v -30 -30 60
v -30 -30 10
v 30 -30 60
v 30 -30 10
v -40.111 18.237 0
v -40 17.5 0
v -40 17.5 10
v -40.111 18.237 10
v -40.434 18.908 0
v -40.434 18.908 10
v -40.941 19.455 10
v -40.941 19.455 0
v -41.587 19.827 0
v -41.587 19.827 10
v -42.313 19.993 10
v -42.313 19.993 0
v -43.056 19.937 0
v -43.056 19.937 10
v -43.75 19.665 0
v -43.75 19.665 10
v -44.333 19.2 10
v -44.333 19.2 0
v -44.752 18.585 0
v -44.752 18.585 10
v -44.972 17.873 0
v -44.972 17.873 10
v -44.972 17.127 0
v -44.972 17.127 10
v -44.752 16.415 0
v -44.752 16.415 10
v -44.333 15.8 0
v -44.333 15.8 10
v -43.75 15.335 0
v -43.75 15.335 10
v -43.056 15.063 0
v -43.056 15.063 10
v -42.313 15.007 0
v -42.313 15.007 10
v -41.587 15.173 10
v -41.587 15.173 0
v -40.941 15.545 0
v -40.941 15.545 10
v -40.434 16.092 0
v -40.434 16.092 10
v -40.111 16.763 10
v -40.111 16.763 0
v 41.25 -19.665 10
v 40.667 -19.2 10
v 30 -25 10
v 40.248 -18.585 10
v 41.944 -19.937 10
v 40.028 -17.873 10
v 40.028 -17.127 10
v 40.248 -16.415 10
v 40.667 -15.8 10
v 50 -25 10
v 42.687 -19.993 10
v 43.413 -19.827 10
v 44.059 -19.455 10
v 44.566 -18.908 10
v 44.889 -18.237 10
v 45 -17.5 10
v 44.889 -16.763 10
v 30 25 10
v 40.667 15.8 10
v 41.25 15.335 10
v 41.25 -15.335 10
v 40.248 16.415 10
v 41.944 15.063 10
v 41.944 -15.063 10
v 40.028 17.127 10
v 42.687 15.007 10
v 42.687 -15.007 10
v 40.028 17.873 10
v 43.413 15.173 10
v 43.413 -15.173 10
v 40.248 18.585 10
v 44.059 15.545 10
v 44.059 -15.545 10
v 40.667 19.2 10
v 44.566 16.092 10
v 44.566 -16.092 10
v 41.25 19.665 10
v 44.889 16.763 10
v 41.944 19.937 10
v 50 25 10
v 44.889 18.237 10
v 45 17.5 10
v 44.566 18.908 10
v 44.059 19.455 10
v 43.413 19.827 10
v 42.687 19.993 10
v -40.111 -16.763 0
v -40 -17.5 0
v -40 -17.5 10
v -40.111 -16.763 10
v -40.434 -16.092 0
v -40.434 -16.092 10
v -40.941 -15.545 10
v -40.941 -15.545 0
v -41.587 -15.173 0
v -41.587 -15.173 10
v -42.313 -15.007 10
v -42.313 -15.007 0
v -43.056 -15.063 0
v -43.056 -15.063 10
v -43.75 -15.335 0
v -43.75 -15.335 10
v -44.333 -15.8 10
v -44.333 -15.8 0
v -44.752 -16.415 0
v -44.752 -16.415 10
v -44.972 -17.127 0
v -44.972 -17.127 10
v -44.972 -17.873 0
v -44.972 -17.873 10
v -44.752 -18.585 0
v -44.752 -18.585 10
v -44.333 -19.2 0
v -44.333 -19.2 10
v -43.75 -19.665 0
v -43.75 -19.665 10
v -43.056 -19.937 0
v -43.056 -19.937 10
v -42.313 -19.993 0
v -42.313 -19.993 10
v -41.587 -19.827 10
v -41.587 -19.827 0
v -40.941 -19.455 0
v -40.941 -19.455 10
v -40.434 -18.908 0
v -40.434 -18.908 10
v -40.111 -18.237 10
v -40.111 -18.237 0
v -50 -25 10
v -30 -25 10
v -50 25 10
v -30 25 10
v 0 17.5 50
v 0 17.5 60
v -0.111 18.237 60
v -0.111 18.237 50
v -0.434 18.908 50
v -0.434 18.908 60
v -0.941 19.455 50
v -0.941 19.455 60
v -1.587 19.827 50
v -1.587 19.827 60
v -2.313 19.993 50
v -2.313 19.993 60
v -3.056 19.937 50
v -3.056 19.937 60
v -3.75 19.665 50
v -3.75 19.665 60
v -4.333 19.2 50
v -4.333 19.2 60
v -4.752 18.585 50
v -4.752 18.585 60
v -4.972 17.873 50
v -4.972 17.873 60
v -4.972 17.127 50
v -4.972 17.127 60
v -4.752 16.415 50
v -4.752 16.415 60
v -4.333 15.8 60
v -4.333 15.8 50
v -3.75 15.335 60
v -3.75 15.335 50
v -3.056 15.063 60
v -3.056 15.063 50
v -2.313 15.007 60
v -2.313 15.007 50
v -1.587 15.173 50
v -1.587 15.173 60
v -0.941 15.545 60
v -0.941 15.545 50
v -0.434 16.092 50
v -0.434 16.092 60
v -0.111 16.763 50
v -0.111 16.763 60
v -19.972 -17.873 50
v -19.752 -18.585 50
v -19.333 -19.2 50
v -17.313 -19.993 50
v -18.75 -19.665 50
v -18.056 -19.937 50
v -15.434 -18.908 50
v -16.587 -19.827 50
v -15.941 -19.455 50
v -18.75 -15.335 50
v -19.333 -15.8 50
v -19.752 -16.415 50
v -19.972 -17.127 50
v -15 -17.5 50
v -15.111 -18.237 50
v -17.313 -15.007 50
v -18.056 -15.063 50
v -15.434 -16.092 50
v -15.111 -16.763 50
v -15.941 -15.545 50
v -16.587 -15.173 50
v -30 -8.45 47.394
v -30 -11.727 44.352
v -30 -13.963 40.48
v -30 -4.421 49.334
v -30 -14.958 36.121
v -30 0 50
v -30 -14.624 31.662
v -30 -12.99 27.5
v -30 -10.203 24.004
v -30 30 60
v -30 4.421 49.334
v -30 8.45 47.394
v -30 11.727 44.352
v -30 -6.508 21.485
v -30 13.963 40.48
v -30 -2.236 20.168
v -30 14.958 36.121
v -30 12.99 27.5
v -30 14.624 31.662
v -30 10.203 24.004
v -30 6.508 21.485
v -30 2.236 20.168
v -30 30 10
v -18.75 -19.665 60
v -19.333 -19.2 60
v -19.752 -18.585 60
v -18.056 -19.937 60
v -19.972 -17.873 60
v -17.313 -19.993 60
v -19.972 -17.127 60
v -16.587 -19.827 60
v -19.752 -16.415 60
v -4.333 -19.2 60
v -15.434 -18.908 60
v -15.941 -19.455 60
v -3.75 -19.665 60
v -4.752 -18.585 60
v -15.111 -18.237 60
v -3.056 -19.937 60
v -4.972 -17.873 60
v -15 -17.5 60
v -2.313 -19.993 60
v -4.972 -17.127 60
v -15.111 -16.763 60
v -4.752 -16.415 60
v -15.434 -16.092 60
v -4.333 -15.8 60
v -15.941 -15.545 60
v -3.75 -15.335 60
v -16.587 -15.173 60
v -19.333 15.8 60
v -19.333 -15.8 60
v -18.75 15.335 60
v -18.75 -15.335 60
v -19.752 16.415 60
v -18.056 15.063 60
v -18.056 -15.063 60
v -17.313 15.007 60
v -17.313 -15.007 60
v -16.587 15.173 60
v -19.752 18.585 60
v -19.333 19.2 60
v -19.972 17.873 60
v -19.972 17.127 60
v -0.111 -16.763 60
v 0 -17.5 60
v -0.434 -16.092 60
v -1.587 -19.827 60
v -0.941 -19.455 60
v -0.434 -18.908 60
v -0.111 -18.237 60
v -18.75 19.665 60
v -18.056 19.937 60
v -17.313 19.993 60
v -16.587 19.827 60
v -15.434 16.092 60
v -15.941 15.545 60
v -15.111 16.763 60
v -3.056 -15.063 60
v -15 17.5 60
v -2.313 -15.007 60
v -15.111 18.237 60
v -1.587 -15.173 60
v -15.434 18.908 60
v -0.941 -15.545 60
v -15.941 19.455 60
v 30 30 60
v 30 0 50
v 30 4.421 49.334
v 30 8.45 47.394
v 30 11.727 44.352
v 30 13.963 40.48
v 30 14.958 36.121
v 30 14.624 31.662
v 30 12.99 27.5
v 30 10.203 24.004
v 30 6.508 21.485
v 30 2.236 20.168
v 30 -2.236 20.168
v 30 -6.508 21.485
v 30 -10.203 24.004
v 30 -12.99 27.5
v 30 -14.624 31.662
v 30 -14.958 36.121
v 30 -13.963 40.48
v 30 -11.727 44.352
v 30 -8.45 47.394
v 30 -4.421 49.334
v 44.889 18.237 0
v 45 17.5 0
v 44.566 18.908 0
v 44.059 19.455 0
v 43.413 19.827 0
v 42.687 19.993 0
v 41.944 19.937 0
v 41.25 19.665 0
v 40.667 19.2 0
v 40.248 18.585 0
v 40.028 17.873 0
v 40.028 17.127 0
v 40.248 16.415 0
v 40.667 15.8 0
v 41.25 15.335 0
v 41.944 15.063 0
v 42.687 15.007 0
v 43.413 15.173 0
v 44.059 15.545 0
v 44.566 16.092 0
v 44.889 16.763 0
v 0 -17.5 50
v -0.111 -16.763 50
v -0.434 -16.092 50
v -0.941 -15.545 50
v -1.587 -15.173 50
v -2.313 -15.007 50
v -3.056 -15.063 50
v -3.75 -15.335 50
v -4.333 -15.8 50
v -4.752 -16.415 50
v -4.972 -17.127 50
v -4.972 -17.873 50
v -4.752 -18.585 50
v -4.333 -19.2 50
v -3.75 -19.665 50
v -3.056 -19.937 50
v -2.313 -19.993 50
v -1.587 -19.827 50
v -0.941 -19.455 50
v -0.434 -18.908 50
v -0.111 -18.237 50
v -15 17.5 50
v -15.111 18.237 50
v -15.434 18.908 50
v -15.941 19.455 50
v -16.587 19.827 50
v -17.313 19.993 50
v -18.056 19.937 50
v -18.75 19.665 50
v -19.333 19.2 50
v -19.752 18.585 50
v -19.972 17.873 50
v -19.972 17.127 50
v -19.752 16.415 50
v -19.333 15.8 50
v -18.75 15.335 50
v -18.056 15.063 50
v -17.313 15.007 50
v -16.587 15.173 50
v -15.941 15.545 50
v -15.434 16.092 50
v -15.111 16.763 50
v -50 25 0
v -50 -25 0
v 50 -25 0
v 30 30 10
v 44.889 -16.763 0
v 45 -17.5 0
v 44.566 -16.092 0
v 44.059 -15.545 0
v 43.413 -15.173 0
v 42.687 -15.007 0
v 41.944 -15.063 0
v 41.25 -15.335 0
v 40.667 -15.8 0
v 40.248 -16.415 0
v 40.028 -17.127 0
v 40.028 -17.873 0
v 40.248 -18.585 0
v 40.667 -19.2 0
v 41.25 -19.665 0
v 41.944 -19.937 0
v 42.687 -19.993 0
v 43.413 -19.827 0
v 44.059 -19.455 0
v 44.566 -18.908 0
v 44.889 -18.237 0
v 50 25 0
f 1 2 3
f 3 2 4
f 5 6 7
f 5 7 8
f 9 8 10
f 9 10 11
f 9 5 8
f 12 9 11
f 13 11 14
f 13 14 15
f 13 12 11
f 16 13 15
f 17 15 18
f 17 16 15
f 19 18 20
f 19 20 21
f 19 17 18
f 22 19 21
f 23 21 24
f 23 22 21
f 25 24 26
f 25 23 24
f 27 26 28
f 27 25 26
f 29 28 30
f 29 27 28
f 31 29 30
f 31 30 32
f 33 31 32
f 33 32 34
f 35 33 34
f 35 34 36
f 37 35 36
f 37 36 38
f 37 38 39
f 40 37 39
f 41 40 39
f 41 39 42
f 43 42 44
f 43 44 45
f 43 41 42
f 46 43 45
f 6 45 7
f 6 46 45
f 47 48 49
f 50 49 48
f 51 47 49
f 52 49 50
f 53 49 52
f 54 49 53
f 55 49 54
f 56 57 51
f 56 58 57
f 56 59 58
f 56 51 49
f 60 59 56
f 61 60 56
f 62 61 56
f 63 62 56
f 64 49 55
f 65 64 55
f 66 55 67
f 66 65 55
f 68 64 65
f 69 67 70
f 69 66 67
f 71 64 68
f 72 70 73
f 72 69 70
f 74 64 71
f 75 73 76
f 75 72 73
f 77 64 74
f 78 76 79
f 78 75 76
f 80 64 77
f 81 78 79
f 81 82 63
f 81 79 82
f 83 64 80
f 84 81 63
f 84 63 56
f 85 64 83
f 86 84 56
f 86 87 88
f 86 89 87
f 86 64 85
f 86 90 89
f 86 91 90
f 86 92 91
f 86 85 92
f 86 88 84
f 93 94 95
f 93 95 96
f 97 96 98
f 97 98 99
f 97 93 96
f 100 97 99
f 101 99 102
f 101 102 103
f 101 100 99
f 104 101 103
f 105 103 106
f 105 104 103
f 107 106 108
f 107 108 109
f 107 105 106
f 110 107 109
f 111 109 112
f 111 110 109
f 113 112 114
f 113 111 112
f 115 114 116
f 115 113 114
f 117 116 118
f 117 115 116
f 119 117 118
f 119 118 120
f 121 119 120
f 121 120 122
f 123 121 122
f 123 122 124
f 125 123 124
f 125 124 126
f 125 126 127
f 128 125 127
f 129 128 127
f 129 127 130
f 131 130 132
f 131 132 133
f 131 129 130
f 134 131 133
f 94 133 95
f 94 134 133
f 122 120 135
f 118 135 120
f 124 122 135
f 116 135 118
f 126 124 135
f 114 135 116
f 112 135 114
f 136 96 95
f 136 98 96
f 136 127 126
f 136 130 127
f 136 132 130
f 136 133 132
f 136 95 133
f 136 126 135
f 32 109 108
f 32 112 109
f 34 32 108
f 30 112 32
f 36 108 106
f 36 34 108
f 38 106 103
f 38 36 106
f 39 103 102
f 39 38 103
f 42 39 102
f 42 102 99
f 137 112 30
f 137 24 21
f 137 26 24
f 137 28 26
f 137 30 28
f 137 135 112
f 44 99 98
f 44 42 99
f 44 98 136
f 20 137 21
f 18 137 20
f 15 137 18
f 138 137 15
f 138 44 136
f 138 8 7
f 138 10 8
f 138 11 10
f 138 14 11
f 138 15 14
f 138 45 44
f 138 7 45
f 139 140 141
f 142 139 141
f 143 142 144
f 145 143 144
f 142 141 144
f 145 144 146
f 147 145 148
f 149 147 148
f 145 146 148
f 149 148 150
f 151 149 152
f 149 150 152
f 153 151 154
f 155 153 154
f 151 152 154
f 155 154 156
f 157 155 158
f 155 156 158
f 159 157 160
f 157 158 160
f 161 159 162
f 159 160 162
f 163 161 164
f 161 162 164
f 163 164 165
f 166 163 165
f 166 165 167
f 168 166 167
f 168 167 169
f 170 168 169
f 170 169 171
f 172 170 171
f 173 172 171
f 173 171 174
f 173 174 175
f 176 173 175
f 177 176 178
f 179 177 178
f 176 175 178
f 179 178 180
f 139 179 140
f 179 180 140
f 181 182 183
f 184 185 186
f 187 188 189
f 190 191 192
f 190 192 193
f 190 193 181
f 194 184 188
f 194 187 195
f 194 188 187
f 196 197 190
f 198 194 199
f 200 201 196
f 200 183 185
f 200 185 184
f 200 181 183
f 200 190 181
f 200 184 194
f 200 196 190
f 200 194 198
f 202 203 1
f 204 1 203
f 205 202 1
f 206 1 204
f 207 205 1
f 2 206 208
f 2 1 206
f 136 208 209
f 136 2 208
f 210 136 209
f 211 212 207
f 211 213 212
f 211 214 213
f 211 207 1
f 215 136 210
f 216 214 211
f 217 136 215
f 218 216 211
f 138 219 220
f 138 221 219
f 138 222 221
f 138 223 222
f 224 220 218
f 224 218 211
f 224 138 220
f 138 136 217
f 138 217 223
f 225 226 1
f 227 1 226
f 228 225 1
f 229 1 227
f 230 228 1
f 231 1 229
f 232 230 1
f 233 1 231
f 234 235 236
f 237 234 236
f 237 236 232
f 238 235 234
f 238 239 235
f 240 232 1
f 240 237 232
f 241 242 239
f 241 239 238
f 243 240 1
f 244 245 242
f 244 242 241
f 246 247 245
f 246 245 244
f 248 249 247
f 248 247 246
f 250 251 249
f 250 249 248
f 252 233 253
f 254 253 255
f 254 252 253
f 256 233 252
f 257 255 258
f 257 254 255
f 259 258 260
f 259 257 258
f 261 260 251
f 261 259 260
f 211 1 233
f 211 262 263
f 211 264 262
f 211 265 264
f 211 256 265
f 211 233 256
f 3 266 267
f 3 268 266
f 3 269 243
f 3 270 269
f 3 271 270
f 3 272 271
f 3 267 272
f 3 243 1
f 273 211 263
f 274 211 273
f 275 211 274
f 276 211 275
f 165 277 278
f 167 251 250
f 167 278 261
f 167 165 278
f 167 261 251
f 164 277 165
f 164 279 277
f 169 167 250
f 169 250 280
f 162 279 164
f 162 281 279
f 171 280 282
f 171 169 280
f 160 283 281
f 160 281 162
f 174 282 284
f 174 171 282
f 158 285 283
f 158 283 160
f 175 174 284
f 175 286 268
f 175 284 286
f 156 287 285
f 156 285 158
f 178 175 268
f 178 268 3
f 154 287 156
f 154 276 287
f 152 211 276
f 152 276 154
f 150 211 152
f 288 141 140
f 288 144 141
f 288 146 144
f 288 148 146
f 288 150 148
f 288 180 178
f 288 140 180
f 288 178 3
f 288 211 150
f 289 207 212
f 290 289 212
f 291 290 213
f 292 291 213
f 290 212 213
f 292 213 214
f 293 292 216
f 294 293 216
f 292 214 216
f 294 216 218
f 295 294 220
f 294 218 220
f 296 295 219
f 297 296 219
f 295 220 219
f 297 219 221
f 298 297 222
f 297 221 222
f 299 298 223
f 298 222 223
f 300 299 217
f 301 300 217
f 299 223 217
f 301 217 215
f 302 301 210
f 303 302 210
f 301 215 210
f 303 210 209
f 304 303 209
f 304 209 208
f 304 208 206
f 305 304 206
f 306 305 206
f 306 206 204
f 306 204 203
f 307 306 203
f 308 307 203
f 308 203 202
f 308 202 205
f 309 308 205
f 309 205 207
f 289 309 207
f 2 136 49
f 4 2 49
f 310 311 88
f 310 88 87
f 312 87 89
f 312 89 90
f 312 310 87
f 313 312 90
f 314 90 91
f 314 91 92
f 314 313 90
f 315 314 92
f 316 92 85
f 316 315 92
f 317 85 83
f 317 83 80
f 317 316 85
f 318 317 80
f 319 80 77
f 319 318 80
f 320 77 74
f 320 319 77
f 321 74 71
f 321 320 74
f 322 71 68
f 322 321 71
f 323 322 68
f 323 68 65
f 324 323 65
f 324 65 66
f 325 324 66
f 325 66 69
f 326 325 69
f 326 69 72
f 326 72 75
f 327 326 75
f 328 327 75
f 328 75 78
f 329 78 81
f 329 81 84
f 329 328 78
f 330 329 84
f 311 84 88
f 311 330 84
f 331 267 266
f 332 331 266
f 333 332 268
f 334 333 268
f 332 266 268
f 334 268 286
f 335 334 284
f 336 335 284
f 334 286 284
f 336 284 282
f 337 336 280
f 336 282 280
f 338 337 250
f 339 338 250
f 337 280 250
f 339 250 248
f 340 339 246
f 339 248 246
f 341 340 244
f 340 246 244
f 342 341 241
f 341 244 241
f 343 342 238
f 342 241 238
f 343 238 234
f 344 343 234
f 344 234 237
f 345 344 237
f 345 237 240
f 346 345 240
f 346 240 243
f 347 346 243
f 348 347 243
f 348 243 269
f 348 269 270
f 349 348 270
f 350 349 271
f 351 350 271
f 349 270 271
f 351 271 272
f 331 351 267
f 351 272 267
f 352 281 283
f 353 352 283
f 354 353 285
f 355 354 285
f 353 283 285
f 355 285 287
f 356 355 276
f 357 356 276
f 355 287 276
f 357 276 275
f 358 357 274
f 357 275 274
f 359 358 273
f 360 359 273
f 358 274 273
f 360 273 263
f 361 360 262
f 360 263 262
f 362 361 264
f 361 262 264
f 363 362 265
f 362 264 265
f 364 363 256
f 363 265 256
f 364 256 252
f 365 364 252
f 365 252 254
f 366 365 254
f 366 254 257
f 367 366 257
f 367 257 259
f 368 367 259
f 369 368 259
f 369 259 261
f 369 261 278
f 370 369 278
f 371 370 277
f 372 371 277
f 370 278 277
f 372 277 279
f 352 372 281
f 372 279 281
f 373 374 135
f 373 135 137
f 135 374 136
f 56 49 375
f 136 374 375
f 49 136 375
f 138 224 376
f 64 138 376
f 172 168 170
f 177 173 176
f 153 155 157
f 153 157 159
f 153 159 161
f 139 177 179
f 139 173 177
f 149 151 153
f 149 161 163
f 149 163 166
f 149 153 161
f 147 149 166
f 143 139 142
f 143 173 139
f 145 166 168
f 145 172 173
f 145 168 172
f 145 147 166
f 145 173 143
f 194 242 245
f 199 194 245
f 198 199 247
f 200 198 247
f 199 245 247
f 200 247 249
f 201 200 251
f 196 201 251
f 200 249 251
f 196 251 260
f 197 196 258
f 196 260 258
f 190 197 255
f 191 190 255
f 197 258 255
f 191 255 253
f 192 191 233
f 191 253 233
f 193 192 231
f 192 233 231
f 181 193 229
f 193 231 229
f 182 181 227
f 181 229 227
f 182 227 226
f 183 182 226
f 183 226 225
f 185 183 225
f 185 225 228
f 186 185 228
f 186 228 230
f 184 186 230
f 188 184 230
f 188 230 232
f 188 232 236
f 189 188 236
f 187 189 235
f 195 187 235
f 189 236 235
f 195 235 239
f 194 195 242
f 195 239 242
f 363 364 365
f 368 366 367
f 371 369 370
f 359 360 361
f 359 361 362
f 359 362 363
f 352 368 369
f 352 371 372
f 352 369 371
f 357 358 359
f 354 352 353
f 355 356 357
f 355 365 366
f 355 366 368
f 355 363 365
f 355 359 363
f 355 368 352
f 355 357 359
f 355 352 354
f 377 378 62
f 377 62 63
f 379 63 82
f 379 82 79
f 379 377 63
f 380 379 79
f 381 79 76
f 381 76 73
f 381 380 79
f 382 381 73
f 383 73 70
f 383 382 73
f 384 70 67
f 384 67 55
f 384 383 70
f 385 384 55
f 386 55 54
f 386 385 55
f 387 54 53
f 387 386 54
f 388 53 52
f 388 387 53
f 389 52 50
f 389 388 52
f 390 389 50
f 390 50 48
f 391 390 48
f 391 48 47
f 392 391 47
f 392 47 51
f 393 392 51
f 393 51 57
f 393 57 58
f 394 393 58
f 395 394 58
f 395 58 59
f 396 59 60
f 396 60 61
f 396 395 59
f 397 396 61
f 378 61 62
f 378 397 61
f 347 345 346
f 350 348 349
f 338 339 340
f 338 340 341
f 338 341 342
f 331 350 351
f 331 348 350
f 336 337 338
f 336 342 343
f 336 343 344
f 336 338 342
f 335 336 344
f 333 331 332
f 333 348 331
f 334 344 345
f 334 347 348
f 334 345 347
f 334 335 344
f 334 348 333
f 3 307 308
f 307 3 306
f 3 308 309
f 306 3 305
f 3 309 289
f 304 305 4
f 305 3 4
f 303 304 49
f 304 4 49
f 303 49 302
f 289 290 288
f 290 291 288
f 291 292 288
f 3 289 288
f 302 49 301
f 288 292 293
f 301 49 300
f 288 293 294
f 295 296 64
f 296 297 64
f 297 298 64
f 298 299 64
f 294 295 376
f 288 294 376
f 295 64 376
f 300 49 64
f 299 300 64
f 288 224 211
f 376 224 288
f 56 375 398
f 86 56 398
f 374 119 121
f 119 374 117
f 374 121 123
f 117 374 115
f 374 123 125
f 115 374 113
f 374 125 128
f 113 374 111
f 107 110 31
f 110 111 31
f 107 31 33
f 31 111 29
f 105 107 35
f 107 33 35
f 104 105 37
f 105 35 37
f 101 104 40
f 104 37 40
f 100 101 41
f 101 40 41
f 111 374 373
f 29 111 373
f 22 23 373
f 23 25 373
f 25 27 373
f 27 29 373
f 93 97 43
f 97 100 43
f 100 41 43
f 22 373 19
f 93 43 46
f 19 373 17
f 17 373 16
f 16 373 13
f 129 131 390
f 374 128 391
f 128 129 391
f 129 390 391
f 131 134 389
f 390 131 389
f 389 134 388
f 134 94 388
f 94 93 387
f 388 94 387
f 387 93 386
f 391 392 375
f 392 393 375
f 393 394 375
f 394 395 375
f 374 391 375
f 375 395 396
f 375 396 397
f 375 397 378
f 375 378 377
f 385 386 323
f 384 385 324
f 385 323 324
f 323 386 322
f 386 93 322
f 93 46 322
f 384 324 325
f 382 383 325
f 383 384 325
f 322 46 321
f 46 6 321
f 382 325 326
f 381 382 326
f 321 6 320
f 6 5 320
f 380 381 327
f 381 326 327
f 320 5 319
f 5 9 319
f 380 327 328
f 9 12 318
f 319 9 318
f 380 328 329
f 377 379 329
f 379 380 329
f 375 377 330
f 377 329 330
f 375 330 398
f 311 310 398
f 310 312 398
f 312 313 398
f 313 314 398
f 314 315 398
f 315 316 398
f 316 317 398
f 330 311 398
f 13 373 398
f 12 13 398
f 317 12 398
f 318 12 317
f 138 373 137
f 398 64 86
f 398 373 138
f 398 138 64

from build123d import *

# Parameters (mm, degrees)
SKETCH1_W           = 100
SKETCH1_H           = 50
SKETCH1_R           = 2.5
BOSS_EXTRUDE1_DEPTH = 10
SKETCH2_W           = 60
SKETCH2_H           = 60
BOSS_EXTRUDE2_DEPTH = 50
SKETCH3_R           = 15
CUT_EXTRUDE1_DEPTH  = 101
SKETCH5_R           = 2.5
CUT_EXTRUDE3_DEPTH  = 10


with BuildPart() as part:
    # Sketch1 → Boss-Extrude1 (new body)
    with BuildSketch(Plane.XY):
        Rectangle(SKETCH1_W, SKETCH1_H)
        with Locations((-42.5, 17.5)):
            Circle(SKETCH1_R, mode=Mode.SUBTRACT)
        with Locations((42.5, 17.5)):
            Circle(SKETCH1_R, mode=Mode.SUBTRACT)
        with Locations((42.5, -17.5)):
            Circle(SKETCH1_R, mode=Mode.SUBTRACT)
        with Locations((-42.5, -17.5)):
            Circle(SKETCH1_R, mode=Mode.SUBTRACT)
    extrude(amount=BOSS_EXTRUDE1_DEPTH)

    # Sketch2 → Boss-Extrude2 (add)
    with BuildSketch(Plane.XY.offset(10)):
        Rectangle(SKETCH2_W, SKETCH2_H)
    extrude(amount=BOSS_EXTRUDE2_DEPTH)

    # Sketch3 → Cut-Extrude1 (cut)
    with BuildSketch(Plane.ZY.offset(30)):
        with Locations((35, 0)):
            Circle(SKETCH3_R)
    extrude(amount=-CUT_EXTRUDE1_DEPTH, mode=Mode.SUBTRACT)

    # Sketch5 → Cut-Extrude3 (cut)
    with BuildSketch(Plane.XY.offset(60)):
        with Locations((-17.5, 17.5)):
            Circle(SKETCH5_R)
        with Locations((-2.5, 17.5)):
            Circle(SKETCH5_R)
        with Locations((-2.5, -17.5)):
            Circle(SKETCH5_R)
        with Locations((-17.5, -17.5)):
            Circle(SKETCH5_R)
    extrude(amount=-CUT_EXTRUDE3_DEPTH, mode=Mode.SUBTRACT)


solid = part.part
